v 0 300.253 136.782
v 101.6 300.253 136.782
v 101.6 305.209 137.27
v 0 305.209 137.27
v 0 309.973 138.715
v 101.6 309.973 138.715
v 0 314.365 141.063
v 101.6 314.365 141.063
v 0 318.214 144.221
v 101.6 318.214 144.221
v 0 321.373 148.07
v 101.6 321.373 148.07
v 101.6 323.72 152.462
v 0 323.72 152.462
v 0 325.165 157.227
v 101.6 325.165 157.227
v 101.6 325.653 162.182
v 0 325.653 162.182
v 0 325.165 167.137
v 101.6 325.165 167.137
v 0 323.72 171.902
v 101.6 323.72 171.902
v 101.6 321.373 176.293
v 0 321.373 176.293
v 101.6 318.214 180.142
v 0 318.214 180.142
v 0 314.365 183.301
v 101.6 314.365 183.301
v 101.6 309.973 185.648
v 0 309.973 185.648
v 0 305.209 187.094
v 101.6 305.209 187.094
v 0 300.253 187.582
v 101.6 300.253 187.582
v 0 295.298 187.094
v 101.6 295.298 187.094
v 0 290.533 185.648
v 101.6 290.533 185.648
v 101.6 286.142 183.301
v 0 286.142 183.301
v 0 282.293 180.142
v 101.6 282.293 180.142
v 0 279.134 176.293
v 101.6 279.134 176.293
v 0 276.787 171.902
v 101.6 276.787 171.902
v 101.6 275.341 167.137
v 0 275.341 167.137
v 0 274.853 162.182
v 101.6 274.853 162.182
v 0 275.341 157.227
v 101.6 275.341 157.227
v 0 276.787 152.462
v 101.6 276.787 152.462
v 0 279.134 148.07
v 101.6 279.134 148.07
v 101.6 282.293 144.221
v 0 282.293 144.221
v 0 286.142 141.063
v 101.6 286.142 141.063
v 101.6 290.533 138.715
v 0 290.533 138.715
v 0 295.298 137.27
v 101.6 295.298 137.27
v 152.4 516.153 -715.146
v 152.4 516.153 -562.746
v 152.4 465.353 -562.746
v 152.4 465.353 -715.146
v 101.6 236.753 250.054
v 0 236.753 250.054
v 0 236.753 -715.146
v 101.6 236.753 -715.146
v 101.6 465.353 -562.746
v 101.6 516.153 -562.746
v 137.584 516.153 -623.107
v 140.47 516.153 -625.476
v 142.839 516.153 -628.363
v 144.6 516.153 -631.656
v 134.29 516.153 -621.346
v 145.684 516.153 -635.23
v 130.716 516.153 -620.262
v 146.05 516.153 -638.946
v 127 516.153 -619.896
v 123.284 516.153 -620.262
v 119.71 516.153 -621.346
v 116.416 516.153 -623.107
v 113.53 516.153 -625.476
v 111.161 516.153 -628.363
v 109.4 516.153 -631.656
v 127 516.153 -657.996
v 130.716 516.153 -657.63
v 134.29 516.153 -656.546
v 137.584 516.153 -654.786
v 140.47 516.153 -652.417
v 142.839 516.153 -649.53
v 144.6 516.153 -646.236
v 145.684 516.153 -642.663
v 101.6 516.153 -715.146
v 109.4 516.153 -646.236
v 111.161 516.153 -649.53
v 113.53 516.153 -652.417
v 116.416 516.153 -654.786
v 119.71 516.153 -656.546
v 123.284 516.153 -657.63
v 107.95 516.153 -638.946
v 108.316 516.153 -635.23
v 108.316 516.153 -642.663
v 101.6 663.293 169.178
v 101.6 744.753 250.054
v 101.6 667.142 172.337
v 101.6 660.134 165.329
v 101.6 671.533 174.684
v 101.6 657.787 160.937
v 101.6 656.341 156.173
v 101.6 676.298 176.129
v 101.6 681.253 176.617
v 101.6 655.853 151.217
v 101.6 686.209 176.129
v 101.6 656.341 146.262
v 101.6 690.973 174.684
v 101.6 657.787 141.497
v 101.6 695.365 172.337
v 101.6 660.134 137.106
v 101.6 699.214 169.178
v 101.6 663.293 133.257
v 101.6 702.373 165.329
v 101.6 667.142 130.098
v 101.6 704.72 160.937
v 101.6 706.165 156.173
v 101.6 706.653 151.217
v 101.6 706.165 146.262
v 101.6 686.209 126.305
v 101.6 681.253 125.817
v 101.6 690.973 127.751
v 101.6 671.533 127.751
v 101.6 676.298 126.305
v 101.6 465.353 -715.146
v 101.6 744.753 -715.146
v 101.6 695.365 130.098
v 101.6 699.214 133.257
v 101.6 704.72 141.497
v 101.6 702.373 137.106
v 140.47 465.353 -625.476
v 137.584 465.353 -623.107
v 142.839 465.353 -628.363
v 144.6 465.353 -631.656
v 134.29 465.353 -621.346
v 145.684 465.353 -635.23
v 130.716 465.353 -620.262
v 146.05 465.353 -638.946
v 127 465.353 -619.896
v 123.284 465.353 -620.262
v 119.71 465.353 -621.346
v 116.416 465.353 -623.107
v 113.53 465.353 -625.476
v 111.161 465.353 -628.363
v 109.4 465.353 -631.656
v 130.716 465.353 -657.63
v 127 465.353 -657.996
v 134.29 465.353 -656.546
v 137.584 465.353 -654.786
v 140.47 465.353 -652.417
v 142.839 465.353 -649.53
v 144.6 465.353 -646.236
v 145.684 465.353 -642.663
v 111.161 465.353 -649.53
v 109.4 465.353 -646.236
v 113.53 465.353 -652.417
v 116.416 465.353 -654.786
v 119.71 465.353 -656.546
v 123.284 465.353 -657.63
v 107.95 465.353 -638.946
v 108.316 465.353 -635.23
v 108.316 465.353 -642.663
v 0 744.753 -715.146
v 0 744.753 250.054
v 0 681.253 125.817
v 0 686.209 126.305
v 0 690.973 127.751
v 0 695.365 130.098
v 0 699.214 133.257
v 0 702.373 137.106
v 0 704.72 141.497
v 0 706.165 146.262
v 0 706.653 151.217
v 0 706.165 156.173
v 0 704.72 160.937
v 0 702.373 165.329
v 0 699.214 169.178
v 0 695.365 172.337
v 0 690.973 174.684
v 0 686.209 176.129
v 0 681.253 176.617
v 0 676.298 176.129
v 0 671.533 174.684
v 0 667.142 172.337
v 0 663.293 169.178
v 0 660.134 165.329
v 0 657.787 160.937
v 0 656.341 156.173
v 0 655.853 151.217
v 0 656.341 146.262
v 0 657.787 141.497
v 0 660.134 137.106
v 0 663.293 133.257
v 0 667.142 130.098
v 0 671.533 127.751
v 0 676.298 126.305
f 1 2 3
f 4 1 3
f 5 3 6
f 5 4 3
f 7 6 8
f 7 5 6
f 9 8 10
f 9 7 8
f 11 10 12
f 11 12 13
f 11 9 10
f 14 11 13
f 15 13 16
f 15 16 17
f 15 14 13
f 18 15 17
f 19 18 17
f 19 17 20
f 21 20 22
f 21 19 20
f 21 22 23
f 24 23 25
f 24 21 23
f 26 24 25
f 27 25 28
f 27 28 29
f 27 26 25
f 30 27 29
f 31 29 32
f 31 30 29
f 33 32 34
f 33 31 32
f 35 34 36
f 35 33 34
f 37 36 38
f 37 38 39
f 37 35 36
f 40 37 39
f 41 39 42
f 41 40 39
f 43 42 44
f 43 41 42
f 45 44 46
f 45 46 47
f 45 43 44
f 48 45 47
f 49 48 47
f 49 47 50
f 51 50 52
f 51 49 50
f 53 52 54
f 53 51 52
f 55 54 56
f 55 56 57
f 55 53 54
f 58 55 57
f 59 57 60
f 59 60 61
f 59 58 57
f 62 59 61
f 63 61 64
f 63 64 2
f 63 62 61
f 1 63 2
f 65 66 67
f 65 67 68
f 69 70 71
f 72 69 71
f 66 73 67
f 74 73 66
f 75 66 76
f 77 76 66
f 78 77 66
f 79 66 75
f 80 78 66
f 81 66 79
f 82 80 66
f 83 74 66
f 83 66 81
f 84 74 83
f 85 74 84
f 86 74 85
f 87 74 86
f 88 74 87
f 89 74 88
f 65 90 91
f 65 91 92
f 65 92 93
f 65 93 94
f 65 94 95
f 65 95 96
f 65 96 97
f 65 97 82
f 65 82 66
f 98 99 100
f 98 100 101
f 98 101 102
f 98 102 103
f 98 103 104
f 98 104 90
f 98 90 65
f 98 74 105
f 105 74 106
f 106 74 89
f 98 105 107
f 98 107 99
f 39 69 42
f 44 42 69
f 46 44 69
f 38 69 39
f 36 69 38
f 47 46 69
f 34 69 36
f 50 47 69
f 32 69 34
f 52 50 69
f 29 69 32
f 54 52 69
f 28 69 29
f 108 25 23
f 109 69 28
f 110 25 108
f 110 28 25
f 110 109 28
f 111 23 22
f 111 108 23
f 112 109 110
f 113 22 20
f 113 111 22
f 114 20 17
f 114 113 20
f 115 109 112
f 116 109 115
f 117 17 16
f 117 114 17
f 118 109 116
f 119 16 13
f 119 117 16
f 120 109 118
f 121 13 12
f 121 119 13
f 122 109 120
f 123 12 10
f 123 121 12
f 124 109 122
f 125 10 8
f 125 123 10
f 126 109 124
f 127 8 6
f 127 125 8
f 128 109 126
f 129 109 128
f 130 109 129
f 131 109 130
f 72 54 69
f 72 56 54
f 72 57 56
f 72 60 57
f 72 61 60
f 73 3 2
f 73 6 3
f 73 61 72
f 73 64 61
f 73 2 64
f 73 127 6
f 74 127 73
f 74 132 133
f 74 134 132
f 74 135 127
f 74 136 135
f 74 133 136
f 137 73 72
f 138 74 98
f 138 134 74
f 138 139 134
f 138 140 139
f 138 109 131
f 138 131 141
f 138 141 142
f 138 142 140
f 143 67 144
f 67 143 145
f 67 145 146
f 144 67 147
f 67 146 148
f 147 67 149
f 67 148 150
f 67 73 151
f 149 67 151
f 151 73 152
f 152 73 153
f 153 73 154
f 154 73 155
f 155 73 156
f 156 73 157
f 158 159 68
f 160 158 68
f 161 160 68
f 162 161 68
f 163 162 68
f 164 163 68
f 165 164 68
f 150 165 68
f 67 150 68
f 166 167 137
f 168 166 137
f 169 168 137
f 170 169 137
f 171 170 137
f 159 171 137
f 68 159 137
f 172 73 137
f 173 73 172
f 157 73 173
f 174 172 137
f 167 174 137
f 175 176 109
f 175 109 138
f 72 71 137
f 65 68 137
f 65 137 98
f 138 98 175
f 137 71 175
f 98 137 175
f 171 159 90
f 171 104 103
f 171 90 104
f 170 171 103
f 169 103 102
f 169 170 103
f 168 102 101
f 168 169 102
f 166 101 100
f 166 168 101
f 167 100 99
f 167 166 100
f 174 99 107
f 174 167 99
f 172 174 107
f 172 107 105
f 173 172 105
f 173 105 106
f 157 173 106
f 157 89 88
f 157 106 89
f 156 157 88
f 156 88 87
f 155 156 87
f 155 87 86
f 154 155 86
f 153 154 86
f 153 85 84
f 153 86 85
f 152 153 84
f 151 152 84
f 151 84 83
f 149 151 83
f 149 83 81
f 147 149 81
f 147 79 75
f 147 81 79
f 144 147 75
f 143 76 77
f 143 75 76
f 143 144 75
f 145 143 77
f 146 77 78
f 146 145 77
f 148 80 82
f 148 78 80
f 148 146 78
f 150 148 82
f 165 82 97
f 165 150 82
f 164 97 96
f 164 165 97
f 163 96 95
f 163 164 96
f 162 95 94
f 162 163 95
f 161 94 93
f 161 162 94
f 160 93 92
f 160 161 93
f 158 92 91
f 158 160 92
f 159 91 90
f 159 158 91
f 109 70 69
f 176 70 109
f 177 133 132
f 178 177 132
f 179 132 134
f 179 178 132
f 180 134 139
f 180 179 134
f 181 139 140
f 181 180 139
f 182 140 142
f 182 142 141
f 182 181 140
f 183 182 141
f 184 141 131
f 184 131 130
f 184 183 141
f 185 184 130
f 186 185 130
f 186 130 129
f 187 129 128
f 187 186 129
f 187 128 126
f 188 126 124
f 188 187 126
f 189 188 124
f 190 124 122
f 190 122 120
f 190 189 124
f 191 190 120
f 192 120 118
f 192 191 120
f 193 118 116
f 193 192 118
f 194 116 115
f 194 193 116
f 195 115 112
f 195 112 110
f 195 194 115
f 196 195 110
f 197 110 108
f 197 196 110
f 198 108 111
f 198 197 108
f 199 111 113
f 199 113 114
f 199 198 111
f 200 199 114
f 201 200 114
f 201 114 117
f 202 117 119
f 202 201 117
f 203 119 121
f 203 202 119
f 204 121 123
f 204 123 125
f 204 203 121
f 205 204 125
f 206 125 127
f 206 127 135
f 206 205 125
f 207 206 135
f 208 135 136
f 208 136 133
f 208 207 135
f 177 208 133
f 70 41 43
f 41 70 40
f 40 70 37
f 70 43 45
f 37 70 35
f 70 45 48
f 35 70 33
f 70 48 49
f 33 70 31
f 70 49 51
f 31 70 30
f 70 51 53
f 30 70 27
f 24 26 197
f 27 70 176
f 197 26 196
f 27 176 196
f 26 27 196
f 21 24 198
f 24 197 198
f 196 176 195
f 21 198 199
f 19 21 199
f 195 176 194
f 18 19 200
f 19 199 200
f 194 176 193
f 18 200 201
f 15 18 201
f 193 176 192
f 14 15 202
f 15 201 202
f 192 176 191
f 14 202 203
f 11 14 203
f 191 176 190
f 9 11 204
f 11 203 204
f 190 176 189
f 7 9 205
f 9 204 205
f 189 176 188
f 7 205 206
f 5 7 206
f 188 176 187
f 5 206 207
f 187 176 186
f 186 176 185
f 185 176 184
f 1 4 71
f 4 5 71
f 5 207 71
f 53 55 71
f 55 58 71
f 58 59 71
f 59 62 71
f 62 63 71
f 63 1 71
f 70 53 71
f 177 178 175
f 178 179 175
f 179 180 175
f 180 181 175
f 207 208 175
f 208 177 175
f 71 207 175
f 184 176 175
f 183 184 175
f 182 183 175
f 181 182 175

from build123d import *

# Parameters (mm, degrees)
SKETCH3_W           = 965.2
SKETCH3_H           = 508
BOSS_EXTRUDE2_DEPTH = 101.6
SKETCH4_R           = 25.4
CUT_EXTRUDE2_DEPTH  = 101.6
SKETCH7_W           = 152.4
SKETCH7_H           = 50.8
BOSS_EXTRUDE4_DEPTH = 152.4
SKETCH10_R          = 19.05
CUT_EXTRUDE3_DEPTH  = 609.6


with BuildPart() as part:
    # Sketch3 → Boss-Extrude2 (new body)
    with BuildSketch(Plane(origin=(0, 0, 0), x_dir=(0, 0, -1), z_dir=(1, 0, 0))):
        with Locations((232.546367736, 490.753272684)):
            Rectangle(SKETCH3_W, SKETCH3_H)
    extrude(amount=BOSS_EXTRUDE2_DEPTH)

    # Sketch4 → Cut-Extrude2 (cut)
    with BuildSketch(Plane(origin=(0, 0, 0), x_dir=(0, 0, -1), z_dir=(1, 0, 0))):
        with Locations((-151.217224275, 681.253272684)):
            Circle(SKETCH4_R)
        with Locations((-162.181898332, 300.253272684)):
            Circle(SKETCH4_R)
    extrude(amount=CUT_EXTRUDE2_DEPTH, mode=Mode.SUBTRACT)

    # Sketch7 → Boss-Extrude4 (add)
    with BuildSketch(Plane(origin=(0, 0, 0), x_dir=(0, 0, -1), z_dir=(1, 0, 0))):
        with Locations((638.946367736, 490.753272684)):
            Rectangle(SKETCH7_W, SKETCH7_H)
    extrude(amount=BOSS_EXTRUDE4_DEPTH)

    # Sketch10 → Cut-Extrude3 (cut)
    with BuildSketch(Plane(origin=(0, 0, 0), x_dir=(1, 0, 0), z_dir=(0, 1, 0))):
        with Locations(Location((127, 638.946367736, 0), (0, 0, 90))):
            Circle(SKETCH10_R)
    extrude(amount=CUT_EXTRUDE3_DEPTH, mode=Mode.SUBTRACT)


solid = part.part
